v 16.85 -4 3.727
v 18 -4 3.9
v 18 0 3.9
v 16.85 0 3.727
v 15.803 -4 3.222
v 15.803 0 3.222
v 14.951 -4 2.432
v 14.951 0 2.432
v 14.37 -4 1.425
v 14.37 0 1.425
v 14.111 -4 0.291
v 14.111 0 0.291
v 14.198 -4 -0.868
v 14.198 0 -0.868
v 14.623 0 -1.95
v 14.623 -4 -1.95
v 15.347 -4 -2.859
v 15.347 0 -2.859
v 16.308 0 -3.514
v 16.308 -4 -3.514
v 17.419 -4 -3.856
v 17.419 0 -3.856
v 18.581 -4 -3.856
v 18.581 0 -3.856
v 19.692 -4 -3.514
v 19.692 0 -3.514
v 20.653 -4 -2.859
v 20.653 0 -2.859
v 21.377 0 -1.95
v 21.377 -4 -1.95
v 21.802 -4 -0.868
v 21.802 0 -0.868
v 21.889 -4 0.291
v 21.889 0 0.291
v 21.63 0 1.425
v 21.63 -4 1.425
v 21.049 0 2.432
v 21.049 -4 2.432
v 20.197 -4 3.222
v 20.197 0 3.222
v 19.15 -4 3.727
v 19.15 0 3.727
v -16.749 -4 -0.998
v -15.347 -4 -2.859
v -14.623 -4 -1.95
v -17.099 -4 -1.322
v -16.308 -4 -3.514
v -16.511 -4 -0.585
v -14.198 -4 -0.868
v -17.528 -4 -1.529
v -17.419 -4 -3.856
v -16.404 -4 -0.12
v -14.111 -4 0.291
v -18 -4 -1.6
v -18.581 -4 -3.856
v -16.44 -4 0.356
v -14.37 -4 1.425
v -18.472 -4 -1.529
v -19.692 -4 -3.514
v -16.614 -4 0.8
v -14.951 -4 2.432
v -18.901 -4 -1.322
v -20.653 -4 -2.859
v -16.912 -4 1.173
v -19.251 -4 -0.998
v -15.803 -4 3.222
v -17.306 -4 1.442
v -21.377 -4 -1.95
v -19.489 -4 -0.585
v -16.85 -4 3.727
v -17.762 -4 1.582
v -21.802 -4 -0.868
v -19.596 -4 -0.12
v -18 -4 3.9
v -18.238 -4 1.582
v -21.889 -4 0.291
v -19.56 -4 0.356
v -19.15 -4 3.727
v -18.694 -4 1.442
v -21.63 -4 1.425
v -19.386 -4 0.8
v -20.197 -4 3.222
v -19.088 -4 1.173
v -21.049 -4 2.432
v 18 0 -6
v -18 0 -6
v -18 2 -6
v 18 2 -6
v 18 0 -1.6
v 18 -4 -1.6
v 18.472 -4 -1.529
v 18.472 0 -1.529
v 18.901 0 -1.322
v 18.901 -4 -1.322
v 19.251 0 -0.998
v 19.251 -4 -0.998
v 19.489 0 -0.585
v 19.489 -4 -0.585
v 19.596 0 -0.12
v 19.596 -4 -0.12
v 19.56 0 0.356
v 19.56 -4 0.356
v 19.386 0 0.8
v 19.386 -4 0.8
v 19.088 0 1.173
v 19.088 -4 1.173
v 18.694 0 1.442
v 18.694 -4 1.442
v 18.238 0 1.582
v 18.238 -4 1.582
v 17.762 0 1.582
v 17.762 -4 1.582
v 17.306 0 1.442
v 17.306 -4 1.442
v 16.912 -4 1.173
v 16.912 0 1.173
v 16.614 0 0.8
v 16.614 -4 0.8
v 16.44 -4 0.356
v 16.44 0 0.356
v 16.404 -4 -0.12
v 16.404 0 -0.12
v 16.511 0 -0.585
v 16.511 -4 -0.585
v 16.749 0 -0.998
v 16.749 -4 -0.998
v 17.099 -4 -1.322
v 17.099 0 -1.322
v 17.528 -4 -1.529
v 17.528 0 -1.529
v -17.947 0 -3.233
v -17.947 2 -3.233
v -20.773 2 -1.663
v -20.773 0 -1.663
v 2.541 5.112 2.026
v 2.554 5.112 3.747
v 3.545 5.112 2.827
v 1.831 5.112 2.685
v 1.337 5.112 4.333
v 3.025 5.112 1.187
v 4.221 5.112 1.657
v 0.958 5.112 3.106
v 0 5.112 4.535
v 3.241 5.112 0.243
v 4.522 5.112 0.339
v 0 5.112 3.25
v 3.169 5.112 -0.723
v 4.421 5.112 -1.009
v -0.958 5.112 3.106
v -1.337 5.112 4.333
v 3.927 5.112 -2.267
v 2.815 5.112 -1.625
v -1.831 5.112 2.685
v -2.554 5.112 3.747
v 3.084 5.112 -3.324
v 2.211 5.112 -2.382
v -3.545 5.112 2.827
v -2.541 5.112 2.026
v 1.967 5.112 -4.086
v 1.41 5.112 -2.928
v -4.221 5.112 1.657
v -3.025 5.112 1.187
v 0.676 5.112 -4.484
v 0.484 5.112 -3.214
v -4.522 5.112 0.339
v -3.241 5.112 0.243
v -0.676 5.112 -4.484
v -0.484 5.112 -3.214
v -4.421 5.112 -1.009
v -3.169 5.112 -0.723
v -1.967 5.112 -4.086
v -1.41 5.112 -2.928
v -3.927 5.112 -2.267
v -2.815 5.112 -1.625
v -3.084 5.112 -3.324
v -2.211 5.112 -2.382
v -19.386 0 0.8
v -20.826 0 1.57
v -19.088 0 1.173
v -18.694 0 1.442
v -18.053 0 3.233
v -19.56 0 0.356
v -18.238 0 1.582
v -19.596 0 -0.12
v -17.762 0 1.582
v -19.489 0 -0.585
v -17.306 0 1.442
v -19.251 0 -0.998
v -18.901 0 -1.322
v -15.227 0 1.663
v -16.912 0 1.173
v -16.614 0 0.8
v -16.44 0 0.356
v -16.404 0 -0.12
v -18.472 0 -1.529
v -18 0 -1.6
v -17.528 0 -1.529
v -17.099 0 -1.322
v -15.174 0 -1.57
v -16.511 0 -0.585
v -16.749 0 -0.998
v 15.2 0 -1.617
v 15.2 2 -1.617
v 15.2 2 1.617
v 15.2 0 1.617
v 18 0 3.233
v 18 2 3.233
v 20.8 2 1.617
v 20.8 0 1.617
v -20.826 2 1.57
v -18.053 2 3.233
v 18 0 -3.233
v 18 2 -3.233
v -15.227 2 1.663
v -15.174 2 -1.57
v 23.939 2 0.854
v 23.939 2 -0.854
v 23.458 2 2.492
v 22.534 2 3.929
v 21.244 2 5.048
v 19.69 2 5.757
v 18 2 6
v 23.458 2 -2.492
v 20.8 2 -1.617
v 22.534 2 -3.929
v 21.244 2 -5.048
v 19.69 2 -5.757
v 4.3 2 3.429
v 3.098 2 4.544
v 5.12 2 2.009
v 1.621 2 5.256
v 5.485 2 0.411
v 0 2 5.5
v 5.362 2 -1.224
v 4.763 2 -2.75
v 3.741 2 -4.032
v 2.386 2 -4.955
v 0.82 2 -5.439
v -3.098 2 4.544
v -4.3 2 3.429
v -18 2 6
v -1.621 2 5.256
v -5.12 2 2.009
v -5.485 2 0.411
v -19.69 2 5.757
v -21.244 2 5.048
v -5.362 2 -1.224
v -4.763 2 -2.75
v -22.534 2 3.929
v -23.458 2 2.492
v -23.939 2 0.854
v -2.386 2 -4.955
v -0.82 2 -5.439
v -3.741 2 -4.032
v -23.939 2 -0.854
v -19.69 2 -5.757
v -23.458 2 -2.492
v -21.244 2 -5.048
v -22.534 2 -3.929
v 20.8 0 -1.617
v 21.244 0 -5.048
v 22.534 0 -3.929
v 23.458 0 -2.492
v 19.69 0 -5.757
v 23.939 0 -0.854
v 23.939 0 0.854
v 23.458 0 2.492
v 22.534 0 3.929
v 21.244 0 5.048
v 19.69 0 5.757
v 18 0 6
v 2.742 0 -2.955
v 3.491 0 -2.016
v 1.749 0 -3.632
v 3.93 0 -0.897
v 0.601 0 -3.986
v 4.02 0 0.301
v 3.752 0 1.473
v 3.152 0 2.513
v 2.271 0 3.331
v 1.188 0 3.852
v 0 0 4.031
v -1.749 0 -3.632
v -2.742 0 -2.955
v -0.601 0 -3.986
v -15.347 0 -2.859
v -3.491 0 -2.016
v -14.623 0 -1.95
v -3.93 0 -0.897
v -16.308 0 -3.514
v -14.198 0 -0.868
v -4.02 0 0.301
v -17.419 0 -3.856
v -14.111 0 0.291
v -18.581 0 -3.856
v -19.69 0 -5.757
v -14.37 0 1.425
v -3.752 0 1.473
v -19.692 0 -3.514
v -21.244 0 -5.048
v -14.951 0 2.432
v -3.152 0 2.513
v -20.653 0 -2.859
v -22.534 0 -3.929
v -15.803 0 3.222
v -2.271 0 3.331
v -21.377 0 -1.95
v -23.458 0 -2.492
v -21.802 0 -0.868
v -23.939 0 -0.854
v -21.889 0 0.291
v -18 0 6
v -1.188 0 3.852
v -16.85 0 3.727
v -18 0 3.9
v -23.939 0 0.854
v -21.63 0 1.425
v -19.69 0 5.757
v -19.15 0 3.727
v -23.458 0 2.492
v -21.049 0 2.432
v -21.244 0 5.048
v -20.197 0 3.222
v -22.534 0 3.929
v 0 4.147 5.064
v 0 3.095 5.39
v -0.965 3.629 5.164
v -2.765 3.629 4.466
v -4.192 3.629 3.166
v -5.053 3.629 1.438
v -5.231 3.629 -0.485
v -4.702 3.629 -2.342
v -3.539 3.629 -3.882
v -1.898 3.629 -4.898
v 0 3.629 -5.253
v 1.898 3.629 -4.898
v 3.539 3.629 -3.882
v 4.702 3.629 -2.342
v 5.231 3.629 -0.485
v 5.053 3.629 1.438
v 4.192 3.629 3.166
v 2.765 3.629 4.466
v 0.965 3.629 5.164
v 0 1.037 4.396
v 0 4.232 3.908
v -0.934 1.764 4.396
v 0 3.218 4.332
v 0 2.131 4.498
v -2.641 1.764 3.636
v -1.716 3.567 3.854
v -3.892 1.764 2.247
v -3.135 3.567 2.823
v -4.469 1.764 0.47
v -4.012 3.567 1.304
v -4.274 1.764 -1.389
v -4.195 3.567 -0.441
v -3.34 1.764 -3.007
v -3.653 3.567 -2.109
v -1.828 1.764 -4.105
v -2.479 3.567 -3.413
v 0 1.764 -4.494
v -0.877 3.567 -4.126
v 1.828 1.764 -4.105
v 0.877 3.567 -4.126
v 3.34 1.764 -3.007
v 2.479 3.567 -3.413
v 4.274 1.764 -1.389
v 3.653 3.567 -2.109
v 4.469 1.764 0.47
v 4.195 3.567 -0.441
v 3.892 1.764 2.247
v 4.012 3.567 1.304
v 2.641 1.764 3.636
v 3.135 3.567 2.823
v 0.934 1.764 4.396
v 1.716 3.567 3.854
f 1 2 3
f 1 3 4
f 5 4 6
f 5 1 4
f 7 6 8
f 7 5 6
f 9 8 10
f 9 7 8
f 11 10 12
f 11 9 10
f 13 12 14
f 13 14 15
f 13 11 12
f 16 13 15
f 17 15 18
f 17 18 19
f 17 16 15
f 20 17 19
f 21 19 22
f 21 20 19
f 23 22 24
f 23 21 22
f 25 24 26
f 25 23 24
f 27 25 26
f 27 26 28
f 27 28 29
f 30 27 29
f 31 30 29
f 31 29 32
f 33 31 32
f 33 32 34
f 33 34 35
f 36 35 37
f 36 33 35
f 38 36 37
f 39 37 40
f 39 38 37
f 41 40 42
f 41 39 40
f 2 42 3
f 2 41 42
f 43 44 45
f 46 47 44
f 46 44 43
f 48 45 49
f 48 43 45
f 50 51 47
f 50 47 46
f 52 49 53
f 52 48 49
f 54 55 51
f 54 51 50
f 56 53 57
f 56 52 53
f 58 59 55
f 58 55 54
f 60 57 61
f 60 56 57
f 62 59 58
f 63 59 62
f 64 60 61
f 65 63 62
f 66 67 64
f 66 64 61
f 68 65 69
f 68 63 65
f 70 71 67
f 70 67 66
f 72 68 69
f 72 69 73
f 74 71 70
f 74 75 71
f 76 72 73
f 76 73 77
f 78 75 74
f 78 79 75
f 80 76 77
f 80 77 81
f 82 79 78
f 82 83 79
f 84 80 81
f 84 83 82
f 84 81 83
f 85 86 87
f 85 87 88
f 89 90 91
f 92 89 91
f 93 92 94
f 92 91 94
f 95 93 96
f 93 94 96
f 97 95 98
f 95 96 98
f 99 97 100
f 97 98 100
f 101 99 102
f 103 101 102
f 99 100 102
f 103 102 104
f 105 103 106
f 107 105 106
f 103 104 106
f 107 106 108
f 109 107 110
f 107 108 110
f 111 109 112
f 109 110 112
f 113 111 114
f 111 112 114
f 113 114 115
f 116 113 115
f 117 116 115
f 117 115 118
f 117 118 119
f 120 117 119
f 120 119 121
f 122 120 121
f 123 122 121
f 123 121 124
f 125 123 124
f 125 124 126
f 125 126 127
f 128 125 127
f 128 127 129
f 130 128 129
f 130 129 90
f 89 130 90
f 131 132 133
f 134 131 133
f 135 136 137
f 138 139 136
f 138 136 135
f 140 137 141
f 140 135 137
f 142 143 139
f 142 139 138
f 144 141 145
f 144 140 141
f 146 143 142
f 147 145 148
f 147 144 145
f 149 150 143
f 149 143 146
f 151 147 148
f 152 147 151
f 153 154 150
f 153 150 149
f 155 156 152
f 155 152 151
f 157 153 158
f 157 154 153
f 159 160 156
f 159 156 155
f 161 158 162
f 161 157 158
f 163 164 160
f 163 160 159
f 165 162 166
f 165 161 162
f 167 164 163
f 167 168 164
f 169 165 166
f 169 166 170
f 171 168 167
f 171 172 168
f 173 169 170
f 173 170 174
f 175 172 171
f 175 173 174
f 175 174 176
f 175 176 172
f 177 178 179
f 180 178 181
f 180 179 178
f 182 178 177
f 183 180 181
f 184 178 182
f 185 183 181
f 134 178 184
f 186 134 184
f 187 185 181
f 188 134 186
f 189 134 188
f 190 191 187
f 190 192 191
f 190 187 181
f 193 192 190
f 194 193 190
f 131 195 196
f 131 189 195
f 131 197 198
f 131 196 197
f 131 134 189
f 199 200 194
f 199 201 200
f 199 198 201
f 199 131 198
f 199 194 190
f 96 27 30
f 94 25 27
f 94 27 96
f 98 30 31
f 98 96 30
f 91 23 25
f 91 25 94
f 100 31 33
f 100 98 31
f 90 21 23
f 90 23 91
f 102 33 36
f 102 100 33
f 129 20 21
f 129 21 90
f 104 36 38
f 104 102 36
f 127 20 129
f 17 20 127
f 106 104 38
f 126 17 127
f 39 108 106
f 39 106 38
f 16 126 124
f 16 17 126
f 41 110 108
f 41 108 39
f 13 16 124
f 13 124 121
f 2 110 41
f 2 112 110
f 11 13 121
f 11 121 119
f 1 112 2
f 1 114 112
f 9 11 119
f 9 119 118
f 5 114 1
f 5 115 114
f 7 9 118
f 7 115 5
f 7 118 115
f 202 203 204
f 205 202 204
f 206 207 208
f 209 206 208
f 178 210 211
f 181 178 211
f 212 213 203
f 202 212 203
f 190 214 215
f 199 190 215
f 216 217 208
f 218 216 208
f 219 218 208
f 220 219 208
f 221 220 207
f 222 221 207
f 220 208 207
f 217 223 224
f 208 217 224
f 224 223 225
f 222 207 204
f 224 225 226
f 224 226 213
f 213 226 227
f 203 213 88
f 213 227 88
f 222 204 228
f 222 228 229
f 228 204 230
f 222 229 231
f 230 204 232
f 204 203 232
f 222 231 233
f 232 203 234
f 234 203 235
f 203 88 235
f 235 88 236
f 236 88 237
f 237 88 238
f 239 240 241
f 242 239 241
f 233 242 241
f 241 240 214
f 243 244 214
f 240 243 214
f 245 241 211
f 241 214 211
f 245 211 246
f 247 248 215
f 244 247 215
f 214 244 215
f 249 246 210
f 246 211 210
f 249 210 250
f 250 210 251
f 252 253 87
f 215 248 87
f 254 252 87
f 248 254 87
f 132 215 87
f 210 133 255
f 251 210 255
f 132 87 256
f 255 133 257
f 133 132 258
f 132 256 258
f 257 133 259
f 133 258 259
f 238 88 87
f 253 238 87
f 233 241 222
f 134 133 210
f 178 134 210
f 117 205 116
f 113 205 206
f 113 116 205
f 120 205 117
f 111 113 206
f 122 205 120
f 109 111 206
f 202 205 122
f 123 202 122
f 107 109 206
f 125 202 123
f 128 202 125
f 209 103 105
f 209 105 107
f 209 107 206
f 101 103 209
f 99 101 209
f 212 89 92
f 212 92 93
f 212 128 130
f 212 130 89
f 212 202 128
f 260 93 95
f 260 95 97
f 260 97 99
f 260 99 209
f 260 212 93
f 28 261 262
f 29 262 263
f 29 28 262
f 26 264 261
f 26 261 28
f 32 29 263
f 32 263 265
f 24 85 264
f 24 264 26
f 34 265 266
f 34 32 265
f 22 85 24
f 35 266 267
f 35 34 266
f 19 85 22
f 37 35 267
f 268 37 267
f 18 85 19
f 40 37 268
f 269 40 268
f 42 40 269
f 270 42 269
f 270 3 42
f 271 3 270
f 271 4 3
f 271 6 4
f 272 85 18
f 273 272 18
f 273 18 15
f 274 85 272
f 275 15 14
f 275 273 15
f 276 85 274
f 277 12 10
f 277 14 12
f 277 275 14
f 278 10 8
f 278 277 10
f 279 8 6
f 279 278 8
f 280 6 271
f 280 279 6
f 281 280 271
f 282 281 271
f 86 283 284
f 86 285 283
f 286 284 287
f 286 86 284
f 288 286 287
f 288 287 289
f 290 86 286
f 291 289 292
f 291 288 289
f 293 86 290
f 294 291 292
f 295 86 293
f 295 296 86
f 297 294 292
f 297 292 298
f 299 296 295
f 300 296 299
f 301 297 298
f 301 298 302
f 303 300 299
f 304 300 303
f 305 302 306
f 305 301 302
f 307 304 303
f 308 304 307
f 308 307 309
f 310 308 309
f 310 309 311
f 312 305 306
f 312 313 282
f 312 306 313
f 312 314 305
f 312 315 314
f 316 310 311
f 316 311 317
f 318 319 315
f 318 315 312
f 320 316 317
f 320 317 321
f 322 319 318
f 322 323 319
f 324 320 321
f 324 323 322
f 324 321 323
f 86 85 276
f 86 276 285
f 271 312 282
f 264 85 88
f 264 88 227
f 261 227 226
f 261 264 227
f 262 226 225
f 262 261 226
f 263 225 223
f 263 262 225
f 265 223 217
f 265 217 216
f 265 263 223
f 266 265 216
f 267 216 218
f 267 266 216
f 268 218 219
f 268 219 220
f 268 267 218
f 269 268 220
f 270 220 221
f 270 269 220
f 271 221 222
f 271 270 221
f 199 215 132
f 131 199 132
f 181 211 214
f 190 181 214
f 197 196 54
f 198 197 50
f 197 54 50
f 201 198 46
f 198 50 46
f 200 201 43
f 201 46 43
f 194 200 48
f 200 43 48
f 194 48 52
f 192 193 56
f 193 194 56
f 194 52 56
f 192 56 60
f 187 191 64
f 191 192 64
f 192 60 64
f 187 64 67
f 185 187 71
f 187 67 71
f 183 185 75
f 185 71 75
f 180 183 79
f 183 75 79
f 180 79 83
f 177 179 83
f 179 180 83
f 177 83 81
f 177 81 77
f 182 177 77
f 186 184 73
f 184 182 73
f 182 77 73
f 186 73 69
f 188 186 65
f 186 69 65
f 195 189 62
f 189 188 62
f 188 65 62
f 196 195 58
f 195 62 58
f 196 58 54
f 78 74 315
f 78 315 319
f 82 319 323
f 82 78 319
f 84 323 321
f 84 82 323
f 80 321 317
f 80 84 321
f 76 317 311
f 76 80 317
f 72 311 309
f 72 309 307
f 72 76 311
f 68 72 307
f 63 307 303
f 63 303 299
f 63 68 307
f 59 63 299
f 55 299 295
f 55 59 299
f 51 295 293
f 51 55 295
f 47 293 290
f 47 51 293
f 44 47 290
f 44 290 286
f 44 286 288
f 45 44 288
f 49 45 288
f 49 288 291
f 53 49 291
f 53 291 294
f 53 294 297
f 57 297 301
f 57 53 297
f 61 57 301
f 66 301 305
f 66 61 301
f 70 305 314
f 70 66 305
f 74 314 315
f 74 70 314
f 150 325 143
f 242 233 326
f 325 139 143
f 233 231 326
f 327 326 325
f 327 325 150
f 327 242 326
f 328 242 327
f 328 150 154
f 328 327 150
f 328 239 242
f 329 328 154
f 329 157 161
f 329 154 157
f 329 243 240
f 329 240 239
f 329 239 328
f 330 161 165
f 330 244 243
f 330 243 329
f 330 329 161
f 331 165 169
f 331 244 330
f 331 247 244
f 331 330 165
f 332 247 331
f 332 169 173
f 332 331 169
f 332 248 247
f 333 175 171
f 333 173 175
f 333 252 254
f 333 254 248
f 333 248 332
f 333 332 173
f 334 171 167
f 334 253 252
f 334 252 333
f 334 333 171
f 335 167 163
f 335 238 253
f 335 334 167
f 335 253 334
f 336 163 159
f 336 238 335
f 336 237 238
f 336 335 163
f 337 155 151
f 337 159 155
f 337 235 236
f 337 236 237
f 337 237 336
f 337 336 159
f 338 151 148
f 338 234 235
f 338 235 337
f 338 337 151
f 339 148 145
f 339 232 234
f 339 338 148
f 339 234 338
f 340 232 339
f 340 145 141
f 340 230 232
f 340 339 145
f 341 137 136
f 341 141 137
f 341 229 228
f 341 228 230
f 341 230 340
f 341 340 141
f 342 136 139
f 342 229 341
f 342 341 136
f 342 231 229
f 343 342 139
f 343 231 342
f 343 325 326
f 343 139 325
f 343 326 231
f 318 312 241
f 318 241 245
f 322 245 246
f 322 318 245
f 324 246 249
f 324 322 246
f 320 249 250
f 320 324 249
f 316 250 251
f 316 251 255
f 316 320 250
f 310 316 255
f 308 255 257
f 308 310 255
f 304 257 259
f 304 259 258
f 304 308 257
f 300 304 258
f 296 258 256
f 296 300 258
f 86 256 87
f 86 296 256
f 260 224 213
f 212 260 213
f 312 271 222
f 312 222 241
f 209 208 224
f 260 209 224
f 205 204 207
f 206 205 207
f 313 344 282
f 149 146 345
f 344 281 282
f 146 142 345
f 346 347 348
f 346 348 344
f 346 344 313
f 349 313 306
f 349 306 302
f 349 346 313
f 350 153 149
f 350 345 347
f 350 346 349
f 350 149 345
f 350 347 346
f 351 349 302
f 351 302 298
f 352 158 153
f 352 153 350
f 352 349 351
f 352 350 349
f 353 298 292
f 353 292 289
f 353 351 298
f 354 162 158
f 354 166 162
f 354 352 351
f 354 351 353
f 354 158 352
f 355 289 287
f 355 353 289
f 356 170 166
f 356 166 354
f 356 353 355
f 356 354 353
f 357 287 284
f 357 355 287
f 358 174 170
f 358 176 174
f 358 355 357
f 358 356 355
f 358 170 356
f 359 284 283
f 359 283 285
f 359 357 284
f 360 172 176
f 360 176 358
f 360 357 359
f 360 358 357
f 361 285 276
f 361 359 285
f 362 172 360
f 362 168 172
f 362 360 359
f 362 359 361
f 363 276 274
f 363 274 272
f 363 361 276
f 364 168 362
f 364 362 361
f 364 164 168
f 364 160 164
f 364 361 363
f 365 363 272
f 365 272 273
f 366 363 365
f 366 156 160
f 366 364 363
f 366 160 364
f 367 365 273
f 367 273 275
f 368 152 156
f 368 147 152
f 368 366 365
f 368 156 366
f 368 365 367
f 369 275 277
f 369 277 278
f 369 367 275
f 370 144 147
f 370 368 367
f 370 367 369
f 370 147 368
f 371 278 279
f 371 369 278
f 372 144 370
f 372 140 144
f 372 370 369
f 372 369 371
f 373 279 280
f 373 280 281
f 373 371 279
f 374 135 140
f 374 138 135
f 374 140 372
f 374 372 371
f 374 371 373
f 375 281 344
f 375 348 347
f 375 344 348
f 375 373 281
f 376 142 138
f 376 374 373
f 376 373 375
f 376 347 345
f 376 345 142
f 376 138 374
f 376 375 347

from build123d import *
from build123d.topology import SkipClean

# Parameters (mm, degrees)
SKETCH1_R           = 1.6
SKETCH1_R_2         = 4.5
BOSS_EXTRUDE1_DEPTH = 2
BOSS_EXTRUDE2_START = 4
SKETCH2_R           = 3.9
SKETCH2_R_2         = 1.6
BOSS_EXTRUDE2_DEPTH = 4
CUT_EXTRUDE1_DEPTH  = 2


with BuildPart() as part:
    # Sketch1 → Boss-Extrude1 (new body)
    with BuildSketch(Plane(origin=(0, 0, 0), x_dir=(1, 0, 0), z_dir=(0, 1, 0))):
        with BuildLine():
            Line((-18, 6), (18, 6))
            ThreePointArc((18, 6), (24, 0), (18, -6))
            Line((18, -6), (-18, -6))
            ThreePointArc((-18, -6), (-24, 0), (-18, 6))
        make_face()
        with Locations(Location((18, 0, 0), (0, 0, 270))):
            Circle(SKETCH1_R, mode=Mode.SUBTRACT)
        with Locations(Location((-18, 0, 0), (0, 0, 90))):
            Circle(SKETCH1_R, mode=Mode.SUBTRACT)
        with Locations(Location((0, 0, 0), (0, 0, 270))):
            Circle(SKETCH1_R_2, mode=Mode.SUBTRACT)
    extrude(amount=BOSS_EXTRUDE1_DEPTH)

    # Sketch2 → Boss-Extrude2 (add)
    # profile 1 of 2: a face of its own
    with SkipClean():  # the faces are left unmerged after this step: merging them gives an invalid solid
        with BuildSketch(Plane.XZ.offset(BOSS_EXTRUDE2_START)):
            with Locations(Location((-18, 0, 0), (0, 0, 90))):
                Circle(SKETCH2_R)
            with Locations(Location((-18, 0, 0), (0, 0, 270))):
                Circle(SKETCH2_R_2, mode=Mode.SUBTRACT)
        # profile 2 of 2: a face of its own
        with BuildSketch(Plane.XZ.offset(BOSS_EXTRUDE2_START)):
            with Locations(Location((18, 0, 0), (0, 0, 90))):
                Circle(SKETCH2_R)
            with Locations(Location((18, 0, 0), (0, 0, 270))):
                Circle(SKETCH2_R_2, mode=Mode.SUBTRACT)
        extrude(amount=-BOSS_EXTRUDE2_DEPTH)

    # Sketch3 → Revolve1 (revolve)
    with SkipClean():  # the faces are left unmerged after this step: merging them gives an invalid solid
        with BuildSketch(Plane(origin=(0, 0, 0), x_dir=(0, 0, -1), z_dir=(1, 0, 0))):
            with BuildLine():
                Line((-3.25, 5.112474899), (-4.534589287, 5.112474899))
                ThreePointArc((-4.534589287, 5.112474899), (-5.463872545, 2.629362224), (-5.123475383, 0))
                Line((-5.123475383, 0), (-4.031128874, 0))
                ThreePointArc((-4.031128874, 0), (-4.448377156, 2.679662181), (-3.25, 5.112474899))
            make_face()
            with BuildLine():
                Line((3.25, 5.112474899), (4.534589287, 5.112474899))
                ThreePointArc((4.534589287, 5.112474899), (5.463872545, 2.629362224), (5.123475383, 0))
                Line((5.123475383, 0), (4.031128874, 0))
                ThreePointArc((4.031128874, 0), (4.448377156, 2.679662181), (3.25, 5.112474899))
            make_face()
        revolve(axis=Axis((0, 5.800326489, 0), (0, -1, 0)))

    # Sketch4 → Cut-Extrude1 (cut)
    with BuildSketch(Plane(origin=(0, 2, 0), x_dir=(1, 0, 0), z_dir=(0, 1, 0))):
        Polygon((-15.227114181, -1.662659787), (-15.173651477, 1.570059667), (-17.946537296, 3.232719455), (-20.772885819, 1.662659787), (-20.826348523, -1.570059667), (-18.053462704, -3.232719455), align=None)
        Polygon((18, -3.233161507), (20.8, -1.616580754), (20.8, 1.616580754), (18, 3.233161507), (15.2, 1.616580754), (15.2, -1.616580754), align=None)
    extrude(amount=-CUT_EXTRUDE1_DEPTH, mode=Mode.SUBTRACT)


solid = part.part
